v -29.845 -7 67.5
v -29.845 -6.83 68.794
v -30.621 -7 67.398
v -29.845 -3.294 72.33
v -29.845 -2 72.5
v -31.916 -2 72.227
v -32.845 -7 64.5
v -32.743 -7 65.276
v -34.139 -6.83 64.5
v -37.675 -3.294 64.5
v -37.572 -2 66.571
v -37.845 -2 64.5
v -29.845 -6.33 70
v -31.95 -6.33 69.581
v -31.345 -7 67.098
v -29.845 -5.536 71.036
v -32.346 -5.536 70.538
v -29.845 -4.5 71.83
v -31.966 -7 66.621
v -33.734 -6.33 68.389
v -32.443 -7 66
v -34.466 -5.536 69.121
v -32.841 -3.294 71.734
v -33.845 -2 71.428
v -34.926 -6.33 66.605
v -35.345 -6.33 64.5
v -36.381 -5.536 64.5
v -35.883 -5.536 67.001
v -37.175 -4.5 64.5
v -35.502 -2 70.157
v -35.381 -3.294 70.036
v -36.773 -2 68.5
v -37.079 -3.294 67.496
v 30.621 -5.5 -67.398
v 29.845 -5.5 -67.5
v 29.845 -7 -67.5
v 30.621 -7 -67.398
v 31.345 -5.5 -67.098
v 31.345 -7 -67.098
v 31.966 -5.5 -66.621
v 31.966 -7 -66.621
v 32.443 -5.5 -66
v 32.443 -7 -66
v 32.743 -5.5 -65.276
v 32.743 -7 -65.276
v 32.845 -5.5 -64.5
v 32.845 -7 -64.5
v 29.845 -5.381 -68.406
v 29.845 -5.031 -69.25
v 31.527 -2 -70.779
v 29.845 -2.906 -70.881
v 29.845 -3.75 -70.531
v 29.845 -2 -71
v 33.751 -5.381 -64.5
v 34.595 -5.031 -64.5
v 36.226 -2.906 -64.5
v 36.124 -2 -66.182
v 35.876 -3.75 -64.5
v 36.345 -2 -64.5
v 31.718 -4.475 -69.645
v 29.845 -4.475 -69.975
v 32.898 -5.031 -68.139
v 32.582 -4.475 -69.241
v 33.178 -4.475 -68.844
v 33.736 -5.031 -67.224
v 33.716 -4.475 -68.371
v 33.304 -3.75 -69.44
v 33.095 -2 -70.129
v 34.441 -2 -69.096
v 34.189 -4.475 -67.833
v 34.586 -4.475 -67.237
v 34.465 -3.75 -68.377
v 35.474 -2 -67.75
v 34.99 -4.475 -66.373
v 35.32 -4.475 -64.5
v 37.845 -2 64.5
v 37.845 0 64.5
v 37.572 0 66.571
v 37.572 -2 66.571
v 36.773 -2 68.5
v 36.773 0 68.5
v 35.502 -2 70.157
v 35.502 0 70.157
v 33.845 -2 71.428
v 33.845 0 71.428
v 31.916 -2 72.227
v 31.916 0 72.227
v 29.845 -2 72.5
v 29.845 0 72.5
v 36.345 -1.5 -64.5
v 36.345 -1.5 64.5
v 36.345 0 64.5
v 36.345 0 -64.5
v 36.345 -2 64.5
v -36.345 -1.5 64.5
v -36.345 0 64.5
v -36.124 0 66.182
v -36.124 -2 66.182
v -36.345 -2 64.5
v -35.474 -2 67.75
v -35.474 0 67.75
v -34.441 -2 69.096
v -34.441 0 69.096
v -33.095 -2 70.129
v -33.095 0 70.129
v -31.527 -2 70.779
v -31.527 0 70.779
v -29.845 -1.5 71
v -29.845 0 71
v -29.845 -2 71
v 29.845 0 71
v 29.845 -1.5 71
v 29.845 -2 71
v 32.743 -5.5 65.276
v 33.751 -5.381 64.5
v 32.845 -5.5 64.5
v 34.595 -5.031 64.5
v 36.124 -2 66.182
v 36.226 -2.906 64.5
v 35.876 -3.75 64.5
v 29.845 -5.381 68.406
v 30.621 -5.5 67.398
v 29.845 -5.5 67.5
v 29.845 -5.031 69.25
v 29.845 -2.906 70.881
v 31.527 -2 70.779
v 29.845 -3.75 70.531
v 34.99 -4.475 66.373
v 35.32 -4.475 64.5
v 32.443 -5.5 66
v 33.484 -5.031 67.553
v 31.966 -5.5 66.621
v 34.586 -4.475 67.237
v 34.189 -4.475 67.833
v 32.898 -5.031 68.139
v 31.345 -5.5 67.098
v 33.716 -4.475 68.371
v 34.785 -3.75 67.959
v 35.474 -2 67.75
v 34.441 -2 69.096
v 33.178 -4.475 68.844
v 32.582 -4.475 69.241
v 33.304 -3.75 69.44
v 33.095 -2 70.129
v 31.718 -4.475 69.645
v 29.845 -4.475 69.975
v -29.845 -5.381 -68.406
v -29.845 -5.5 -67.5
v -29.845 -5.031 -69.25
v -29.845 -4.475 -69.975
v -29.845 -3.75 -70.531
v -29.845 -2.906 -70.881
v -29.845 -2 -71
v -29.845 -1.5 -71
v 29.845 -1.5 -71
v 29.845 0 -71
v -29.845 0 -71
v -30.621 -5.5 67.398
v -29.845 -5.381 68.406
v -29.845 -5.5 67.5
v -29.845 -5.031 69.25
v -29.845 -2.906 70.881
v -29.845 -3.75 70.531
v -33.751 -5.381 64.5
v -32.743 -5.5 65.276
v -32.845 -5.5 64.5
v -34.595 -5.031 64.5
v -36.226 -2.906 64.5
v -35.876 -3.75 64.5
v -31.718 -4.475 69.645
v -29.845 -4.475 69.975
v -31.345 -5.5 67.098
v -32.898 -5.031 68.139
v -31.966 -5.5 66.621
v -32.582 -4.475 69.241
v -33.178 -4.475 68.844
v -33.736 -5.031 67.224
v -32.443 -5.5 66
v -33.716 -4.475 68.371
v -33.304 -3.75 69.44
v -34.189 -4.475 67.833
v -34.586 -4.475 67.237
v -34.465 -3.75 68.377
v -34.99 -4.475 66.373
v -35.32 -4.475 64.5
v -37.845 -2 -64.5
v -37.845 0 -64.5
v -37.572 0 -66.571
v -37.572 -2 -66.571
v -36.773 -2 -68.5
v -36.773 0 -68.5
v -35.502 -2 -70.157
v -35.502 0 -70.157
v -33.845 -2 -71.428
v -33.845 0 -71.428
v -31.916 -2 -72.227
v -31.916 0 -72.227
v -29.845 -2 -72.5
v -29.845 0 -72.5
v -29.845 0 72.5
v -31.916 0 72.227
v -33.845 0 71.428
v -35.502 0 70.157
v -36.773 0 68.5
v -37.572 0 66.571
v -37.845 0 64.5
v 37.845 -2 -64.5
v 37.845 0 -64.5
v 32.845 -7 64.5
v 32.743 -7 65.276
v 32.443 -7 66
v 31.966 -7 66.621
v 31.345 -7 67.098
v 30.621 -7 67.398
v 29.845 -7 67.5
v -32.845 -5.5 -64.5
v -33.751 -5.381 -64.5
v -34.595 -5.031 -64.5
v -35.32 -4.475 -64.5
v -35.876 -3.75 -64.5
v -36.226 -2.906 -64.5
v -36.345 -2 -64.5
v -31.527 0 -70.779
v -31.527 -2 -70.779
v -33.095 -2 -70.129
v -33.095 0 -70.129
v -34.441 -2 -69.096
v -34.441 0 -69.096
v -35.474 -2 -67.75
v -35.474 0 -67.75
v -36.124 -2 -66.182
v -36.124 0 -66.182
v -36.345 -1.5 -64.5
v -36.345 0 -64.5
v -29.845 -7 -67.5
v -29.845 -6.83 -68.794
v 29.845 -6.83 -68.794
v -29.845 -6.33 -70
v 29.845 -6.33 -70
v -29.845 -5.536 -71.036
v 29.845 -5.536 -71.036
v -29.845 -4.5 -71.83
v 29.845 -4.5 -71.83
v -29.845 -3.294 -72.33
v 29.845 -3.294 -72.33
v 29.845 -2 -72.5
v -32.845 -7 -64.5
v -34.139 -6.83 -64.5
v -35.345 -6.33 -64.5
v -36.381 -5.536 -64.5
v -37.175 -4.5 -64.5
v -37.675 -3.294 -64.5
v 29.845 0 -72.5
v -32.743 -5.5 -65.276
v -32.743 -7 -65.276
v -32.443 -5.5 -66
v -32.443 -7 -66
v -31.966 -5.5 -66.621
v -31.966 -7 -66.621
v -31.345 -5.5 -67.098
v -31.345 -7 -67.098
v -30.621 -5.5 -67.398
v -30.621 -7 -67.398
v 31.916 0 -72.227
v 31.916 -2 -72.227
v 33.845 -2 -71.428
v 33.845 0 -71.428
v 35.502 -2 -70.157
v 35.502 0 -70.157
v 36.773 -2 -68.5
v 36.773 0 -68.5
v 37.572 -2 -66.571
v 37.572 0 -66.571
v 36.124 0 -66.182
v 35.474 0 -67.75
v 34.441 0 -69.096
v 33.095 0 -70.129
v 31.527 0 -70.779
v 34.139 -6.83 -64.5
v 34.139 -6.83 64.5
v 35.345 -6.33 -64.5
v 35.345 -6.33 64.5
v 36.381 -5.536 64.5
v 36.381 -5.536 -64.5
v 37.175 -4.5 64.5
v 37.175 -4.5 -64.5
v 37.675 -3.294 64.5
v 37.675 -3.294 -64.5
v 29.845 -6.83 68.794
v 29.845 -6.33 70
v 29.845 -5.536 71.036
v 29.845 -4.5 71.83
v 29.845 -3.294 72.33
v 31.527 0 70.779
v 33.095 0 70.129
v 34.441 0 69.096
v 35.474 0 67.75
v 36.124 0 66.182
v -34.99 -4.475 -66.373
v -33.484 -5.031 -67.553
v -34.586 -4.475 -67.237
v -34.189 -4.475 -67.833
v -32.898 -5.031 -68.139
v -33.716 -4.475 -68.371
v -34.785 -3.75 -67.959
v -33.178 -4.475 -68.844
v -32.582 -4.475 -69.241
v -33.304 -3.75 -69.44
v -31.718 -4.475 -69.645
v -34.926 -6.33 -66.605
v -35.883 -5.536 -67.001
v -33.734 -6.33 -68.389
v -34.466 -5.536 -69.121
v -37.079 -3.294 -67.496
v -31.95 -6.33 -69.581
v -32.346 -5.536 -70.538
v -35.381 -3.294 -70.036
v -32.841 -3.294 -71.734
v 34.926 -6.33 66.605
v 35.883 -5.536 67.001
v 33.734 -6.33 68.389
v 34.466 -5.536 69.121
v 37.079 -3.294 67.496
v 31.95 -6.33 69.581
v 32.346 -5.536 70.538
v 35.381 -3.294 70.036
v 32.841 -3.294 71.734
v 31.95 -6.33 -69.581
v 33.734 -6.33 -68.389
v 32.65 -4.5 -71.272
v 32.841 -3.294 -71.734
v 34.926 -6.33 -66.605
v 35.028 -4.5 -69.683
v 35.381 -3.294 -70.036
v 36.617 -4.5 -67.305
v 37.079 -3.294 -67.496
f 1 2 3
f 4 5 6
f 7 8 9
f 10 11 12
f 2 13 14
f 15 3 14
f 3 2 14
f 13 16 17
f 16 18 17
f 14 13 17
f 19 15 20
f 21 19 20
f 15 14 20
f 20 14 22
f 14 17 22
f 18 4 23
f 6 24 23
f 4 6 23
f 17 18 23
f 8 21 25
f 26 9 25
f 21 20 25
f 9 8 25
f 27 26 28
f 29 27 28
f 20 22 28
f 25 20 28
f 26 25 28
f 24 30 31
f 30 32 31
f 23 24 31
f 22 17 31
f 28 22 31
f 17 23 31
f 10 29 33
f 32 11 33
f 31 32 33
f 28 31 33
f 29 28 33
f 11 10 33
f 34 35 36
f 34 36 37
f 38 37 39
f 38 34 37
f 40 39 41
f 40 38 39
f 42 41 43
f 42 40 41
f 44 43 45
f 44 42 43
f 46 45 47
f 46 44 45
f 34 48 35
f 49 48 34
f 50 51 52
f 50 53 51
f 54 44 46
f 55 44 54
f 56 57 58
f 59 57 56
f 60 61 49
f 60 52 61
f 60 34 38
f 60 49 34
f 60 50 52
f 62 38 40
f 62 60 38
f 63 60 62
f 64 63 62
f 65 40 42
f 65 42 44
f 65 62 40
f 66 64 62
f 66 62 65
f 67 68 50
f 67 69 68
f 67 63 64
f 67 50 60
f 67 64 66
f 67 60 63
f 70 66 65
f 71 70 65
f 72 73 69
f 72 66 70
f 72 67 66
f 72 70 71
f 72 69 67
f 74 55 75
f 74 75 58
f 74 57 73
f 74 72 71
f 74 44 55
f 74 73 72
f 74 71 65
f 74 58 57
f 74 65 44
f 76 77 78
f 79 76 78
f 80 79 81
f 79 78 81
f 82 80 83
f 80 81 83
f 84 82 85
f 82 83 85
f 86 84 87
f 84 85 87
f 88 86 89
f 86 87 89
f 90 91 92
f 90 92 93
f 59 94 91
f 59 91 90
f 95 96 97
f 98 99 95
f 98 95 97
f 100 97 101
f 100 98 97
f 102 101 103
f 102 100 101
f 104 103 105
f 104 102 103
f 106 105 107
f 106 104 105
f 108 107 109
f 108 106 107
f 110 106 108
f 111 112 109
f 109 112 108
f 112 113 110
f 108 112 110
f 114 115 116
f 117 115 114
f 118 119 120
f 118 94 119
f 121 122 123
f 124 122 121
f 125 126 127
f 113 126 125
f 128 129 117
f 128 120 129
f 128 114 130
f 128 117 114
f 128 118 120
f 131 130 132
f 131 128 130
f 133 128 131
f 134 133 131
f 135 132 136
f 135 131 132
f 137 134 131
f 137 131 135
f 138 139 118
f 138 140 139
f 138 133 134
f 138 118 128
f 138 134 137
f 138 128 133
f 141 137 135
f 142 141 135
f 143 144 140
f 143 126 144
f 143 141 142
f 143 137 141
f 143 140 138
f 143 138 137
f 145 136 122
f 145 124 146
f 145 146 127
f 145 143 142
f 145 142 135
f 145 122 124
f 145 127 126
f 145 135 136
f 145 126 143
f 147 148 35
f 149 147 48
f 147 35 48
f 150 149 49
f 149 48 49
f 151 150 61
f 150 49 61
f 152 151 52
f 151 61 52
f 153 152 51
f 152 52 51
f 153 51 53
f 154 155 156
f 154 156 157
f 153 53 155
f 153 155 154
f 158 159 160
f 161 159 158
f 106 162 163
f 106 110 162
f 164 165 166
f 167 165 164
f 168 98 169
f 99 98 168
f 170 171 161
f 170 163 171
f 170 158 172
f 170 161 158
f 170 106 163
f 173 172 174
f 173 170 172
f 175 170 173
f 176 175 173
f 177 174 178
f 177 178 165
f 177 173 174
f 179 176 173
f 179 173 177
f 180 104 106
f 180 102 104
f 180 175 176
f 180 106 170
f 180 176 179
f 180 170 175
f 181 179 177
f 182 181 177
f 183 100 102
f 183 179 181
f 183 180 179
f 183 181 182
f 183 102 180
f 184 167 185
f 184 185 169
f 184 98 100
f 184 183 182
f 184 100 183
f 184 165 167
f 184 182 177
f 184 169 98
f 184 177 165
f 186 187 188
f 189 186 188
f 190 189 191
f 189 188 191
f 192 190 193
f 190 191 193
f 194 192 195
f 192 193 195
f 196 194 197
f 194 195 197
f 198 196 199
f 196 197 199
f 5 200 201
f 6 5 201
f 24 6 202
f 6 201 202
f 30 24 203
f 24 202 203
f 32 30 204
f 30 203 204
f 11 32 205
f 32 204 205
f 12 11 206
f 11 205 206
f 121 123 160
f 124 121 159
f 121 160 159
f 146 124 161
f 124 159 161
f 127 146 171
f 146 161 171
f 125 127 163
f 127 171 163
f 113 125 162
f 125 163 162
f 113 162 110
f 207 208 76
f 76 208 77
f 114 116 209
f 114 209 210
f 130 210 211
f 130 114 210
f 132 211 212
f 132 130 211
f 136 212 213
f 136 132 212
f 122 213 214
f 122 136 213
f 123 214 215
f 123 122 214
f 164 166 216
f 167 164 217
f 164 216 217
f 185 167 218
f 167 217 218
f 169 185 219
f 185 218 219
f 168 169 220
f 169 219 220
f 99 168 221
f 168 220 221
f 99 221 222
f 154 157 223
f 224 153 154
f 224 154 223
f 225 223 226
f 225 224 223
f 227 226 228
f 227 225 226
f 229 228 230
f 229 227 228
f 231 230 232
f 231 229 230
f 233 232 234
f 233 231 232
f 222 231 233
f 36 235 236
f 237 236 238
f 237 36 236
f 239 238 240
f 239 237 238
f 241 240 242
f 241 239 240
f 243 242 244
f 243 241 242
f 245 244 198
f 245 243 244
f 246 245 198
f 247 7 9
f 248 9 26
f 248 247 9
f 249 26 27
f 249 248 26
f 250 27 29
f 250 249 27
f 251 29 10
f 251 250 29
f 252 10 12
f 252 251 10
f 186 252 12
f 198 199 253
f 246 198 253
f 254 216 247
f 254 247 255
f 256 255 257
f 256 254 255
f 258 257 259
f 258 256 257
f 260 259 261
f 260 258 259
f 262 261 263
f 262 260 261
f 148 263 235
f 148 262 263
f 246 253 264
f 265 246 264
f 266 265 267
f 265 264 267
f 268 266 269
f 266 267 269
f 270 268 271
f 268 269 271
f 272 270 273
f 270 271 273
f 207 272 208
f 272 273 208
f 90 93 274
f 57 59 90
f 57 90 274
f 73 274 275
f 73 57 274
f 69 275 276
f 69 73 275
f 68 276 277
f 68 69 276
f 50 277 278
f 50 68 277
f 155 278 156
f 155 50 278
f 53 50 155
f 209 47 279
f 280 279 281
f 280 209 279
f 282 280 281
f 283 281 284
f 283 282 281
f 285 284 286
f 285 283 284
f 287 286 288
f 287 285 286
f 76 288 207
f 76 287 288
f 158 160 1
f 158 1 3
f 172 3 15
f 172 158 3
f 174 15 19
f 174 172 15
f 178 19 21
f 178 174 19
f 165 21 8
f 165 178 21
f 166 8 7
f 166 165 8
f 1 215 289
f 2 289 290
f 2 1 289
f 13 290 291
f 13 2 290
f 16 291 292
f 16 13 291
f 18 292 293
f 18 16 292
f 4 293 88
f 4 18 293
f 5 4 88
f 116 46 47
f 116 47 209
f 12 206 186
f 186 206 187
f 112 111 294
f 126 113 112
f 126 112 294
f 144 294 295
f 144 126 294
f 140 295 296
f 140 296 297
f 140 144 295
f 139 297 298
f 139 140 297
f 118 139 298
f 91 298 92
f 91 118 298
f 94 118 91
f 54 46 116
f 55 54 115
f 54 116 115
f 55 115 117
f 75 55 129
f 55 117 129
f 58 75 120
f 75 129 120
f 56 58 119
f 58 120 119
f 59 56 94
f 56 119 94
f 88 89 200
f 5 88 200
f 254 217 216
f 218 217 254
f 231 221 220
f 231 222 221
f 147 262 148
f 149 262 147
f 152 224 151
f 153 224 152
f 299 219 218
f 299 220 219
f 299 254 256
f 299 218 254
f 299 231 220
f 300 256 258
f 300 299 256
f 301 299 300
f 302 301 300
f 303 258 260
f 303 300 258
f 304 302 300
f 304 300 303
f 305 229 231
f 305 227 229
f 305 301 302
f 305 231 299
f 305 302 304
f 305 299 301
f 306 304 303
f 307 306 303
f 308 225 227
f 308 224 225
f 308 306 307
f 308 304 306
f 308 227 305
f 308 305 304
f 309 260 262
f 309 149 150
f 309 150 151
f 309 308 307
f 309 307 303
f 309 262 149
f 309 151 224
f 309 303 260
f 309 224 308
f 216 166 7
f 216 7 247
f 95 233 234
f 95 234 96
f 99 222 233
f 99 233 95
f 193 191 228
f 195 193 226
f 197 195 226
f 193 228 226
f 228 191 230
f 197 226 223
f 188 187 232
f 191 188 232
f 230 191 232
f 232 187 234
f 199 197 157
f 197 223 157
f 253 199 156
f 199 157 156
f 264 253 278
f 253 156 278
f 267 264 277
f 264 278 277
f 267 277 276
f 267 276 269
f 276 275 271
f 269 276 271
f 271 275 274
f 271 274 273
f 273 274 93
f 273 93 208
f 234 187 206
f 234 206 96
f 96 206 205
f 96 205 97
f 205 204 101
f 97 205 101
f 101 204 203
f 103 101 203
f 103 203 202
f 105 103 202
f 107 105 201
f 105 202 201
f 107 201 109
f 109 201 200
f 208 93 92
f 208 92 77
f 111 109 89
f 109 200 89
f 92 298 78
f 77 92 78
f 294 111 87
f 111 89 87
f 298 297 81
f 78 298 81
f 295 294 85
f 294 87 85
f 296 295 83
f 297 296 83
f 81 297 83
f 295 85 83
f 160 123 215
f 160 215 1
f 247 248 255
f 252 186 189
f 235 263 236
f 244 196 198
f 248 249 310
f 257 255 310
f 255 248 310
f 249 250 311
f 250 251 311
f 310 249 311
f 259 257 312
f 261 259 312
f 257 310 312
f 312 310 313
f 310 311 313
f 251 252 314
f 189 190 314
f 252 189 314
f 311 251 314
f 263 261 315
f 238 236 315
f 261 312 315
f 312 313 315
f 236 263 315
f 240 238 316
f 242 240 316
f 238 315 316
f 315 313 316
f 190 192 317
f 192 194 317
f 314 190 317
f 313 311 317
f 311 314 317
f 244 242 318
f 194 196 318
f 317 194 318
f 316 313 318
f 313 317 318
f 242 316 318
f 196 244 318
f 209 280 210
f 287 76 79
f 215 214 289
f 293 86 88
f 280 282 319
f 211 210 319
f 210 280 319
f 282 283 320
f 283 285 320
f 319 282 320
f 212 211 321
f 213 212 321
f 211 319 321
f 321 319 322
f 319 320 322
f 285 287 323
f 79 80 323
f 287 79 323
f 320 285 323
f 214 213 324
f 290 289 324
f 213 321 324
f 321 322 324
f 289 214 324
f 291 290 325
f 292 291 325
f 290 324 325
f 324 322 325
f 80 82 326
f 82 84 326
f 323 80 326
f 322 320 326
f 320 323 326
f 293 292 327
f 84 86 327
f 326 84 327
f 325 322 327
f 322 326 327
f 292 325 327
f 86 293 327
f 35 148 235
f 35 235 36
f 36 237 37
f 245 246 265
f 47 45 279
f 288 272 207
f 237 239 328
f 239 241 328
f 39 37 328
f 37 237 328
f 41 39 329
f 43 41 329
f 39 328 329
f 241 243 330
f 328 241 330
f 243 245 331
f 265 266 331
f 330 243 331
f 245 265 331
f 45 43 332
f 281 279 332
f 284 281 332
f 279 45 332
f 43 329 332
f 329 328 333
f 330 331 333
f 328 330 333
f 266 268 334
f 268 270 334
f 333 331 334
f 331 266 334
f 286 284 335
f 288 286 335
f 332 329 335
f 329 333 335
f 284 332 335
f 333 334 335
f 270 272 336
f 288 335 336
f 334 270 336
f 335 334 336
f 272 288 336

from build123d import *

# Parameters (mm, degrees)
F1_DEPTH = 5.11
F2_R     = 5
F3_DEPTH = 7
F4_R     = 5
F5_T     = -1.5


# Not quite as in the source:
# - a shell that OpenCascade refuses in one call is made with other operations: the cavity is built on its own and cut out


with BuildPart() as f1:
    # F0 (on Front) → F1 (new body)
    with BuildSketch(Plane.XZ):
        with BuildLine():
            Line((28.845, 71.765), (-28.845, 71.765))
            ThreePointArc((-28.845, 71.765), (-34.5018542495, 69.4218542495), (-36.845, 63.765))
            Line((-36.845, 63.765), (-36.845, -63.765))
            ThreePointArc((-36.845, -63.765), (-34.5018542495, -69.4218542495), (-28.845, -71.765))
            Line((-28.845, -71.765), (28.845, -71.765))
            ThreePointArc((28.845, -71.765), (34.5018542495, -69.4218542495), (36.845, -63.765))
            Line((36.845, -63.765), (36.845, 63.765))
            ThreePointArc((36.845, 63.765), (34.5018542495, 69.4218542495), (28.845, 71.765))
        make_face()
    extrude(amount=F1_DEPTH)

    # F2
    f2_edges = [f1.edges().sort_by_distance(p)[0] for p in [
        (36.845, -5.11, 0),
    ]]
    fillet(f2_edges, radius=F2_R)

    # F0 (on Front) → F3 (join)
    with BuildSketch(Plane.XZ):
        with BuildLine():
            Line((29.845, 72.5), (-29.845, 72.5))
            ThreePointArc((-29.845, 72.5), (-35.5018542495, 70.1568542495), (-37.845, 64.5))
            Line((-37.845, 64.5), (-37.845, -64.5))
            ThreePointArc((-37.845, -64.5), (-35.5018542495, -70.1568542495), (-29.845, -72.5))
            Line((-29.845, -72.5), (29.845, -72.5))
            ThreePointArc((29.845, -72.5), (35.5018542495, -70.1568542495), (37.845, -64.5))
            Line((37.845, -64.5), (37.845, 64.5))
            ThreePointArc((37.845, 64.5), (35.5018542495, 70.1568542495), (29.845, 72.5))
        make_face()
        with BuildLine():
            ThreePointArc((-36.845, 63.765), (-34.5018542495, 69.4218542495), (-28.845, 71.765))
            Line((-28.845, 71.765), (28.845, 71.765))
            ThreePointArc((28.845, 71.765), (34.5018542495, 69.4218542495), (36.845, 63.765))
            Line((36.845, 63.765), (36.845, -63.765))
            ThreePointArc((36.845, -63.765), (34.5018542495, -69.4218542495), (28.845, -71.765))
            Line((28.845, -71.765), (-28.845, -71.765))
            ThreePointArc((-28.845, -71.765), (-34.5018542495, -69.4218542495), (-36.845, -63.765))
            Line((-36.845, -63.765), (-36.845, 63.765))
        make_face(mode=Mode.SUBTRACT)
        with BuildLine():
            Line((28.845, 71.765), (-28.845, 71.765))
            ThreePointArc((-28.845, 71.765), (-34.5018542495, 69.4218542495), (-36.845, 63.765))
            Line((-36.845, 63.765), (-36.845, -63.765))
            ThreePointArc((-36.845, -63.765), (-34.5018542495, -69.4218542495), (-28.845, -71.765))
            Line((-28.845, -71.765), (28.845, -71.765))
            ThreePointArc((28.845, -71.765), (34.5018542495, -69.4218542495), (36.845, -63.765))
            Line((36.845, -63.765), (36.845, 63.765))
            ThreePointArc((36.845, 63.765), (34.5018542495, 69.4218542495), (28.845, 71.765))
        make_face()
    extrude(amount=F3_DEPTH)

    # F4
    f4_edges = [f1.edges().sort_by_distance(p)[0] for p in [
        (37.845, -7, 0),
    ]]
    fillet(f4_edges, radius=F4_R)

    # F5: a shell. OpenCascade refuses it in one call, so the cavity is built on its own and cut out:
    # the body offset inwards by the wall thickness, plus a prism from it out through each open face.
    f5_core = offset(f1.part, amount=F5_T, kind=Kind.INTERSECTION, mode=Mode.PRIVATE)
    f5_exits = [f5_core.faces().sort_by_distance(p)[0] for p in [
        (0, -1.5, 0),
        (0, -5.5, 0),
    ]]
    add(f5_core, mode=Mode.SUBTRACT)
    extrude(f5_exits, amount=-F5_T, mode=Mode.SUBTRACT)


solid = f1.part
